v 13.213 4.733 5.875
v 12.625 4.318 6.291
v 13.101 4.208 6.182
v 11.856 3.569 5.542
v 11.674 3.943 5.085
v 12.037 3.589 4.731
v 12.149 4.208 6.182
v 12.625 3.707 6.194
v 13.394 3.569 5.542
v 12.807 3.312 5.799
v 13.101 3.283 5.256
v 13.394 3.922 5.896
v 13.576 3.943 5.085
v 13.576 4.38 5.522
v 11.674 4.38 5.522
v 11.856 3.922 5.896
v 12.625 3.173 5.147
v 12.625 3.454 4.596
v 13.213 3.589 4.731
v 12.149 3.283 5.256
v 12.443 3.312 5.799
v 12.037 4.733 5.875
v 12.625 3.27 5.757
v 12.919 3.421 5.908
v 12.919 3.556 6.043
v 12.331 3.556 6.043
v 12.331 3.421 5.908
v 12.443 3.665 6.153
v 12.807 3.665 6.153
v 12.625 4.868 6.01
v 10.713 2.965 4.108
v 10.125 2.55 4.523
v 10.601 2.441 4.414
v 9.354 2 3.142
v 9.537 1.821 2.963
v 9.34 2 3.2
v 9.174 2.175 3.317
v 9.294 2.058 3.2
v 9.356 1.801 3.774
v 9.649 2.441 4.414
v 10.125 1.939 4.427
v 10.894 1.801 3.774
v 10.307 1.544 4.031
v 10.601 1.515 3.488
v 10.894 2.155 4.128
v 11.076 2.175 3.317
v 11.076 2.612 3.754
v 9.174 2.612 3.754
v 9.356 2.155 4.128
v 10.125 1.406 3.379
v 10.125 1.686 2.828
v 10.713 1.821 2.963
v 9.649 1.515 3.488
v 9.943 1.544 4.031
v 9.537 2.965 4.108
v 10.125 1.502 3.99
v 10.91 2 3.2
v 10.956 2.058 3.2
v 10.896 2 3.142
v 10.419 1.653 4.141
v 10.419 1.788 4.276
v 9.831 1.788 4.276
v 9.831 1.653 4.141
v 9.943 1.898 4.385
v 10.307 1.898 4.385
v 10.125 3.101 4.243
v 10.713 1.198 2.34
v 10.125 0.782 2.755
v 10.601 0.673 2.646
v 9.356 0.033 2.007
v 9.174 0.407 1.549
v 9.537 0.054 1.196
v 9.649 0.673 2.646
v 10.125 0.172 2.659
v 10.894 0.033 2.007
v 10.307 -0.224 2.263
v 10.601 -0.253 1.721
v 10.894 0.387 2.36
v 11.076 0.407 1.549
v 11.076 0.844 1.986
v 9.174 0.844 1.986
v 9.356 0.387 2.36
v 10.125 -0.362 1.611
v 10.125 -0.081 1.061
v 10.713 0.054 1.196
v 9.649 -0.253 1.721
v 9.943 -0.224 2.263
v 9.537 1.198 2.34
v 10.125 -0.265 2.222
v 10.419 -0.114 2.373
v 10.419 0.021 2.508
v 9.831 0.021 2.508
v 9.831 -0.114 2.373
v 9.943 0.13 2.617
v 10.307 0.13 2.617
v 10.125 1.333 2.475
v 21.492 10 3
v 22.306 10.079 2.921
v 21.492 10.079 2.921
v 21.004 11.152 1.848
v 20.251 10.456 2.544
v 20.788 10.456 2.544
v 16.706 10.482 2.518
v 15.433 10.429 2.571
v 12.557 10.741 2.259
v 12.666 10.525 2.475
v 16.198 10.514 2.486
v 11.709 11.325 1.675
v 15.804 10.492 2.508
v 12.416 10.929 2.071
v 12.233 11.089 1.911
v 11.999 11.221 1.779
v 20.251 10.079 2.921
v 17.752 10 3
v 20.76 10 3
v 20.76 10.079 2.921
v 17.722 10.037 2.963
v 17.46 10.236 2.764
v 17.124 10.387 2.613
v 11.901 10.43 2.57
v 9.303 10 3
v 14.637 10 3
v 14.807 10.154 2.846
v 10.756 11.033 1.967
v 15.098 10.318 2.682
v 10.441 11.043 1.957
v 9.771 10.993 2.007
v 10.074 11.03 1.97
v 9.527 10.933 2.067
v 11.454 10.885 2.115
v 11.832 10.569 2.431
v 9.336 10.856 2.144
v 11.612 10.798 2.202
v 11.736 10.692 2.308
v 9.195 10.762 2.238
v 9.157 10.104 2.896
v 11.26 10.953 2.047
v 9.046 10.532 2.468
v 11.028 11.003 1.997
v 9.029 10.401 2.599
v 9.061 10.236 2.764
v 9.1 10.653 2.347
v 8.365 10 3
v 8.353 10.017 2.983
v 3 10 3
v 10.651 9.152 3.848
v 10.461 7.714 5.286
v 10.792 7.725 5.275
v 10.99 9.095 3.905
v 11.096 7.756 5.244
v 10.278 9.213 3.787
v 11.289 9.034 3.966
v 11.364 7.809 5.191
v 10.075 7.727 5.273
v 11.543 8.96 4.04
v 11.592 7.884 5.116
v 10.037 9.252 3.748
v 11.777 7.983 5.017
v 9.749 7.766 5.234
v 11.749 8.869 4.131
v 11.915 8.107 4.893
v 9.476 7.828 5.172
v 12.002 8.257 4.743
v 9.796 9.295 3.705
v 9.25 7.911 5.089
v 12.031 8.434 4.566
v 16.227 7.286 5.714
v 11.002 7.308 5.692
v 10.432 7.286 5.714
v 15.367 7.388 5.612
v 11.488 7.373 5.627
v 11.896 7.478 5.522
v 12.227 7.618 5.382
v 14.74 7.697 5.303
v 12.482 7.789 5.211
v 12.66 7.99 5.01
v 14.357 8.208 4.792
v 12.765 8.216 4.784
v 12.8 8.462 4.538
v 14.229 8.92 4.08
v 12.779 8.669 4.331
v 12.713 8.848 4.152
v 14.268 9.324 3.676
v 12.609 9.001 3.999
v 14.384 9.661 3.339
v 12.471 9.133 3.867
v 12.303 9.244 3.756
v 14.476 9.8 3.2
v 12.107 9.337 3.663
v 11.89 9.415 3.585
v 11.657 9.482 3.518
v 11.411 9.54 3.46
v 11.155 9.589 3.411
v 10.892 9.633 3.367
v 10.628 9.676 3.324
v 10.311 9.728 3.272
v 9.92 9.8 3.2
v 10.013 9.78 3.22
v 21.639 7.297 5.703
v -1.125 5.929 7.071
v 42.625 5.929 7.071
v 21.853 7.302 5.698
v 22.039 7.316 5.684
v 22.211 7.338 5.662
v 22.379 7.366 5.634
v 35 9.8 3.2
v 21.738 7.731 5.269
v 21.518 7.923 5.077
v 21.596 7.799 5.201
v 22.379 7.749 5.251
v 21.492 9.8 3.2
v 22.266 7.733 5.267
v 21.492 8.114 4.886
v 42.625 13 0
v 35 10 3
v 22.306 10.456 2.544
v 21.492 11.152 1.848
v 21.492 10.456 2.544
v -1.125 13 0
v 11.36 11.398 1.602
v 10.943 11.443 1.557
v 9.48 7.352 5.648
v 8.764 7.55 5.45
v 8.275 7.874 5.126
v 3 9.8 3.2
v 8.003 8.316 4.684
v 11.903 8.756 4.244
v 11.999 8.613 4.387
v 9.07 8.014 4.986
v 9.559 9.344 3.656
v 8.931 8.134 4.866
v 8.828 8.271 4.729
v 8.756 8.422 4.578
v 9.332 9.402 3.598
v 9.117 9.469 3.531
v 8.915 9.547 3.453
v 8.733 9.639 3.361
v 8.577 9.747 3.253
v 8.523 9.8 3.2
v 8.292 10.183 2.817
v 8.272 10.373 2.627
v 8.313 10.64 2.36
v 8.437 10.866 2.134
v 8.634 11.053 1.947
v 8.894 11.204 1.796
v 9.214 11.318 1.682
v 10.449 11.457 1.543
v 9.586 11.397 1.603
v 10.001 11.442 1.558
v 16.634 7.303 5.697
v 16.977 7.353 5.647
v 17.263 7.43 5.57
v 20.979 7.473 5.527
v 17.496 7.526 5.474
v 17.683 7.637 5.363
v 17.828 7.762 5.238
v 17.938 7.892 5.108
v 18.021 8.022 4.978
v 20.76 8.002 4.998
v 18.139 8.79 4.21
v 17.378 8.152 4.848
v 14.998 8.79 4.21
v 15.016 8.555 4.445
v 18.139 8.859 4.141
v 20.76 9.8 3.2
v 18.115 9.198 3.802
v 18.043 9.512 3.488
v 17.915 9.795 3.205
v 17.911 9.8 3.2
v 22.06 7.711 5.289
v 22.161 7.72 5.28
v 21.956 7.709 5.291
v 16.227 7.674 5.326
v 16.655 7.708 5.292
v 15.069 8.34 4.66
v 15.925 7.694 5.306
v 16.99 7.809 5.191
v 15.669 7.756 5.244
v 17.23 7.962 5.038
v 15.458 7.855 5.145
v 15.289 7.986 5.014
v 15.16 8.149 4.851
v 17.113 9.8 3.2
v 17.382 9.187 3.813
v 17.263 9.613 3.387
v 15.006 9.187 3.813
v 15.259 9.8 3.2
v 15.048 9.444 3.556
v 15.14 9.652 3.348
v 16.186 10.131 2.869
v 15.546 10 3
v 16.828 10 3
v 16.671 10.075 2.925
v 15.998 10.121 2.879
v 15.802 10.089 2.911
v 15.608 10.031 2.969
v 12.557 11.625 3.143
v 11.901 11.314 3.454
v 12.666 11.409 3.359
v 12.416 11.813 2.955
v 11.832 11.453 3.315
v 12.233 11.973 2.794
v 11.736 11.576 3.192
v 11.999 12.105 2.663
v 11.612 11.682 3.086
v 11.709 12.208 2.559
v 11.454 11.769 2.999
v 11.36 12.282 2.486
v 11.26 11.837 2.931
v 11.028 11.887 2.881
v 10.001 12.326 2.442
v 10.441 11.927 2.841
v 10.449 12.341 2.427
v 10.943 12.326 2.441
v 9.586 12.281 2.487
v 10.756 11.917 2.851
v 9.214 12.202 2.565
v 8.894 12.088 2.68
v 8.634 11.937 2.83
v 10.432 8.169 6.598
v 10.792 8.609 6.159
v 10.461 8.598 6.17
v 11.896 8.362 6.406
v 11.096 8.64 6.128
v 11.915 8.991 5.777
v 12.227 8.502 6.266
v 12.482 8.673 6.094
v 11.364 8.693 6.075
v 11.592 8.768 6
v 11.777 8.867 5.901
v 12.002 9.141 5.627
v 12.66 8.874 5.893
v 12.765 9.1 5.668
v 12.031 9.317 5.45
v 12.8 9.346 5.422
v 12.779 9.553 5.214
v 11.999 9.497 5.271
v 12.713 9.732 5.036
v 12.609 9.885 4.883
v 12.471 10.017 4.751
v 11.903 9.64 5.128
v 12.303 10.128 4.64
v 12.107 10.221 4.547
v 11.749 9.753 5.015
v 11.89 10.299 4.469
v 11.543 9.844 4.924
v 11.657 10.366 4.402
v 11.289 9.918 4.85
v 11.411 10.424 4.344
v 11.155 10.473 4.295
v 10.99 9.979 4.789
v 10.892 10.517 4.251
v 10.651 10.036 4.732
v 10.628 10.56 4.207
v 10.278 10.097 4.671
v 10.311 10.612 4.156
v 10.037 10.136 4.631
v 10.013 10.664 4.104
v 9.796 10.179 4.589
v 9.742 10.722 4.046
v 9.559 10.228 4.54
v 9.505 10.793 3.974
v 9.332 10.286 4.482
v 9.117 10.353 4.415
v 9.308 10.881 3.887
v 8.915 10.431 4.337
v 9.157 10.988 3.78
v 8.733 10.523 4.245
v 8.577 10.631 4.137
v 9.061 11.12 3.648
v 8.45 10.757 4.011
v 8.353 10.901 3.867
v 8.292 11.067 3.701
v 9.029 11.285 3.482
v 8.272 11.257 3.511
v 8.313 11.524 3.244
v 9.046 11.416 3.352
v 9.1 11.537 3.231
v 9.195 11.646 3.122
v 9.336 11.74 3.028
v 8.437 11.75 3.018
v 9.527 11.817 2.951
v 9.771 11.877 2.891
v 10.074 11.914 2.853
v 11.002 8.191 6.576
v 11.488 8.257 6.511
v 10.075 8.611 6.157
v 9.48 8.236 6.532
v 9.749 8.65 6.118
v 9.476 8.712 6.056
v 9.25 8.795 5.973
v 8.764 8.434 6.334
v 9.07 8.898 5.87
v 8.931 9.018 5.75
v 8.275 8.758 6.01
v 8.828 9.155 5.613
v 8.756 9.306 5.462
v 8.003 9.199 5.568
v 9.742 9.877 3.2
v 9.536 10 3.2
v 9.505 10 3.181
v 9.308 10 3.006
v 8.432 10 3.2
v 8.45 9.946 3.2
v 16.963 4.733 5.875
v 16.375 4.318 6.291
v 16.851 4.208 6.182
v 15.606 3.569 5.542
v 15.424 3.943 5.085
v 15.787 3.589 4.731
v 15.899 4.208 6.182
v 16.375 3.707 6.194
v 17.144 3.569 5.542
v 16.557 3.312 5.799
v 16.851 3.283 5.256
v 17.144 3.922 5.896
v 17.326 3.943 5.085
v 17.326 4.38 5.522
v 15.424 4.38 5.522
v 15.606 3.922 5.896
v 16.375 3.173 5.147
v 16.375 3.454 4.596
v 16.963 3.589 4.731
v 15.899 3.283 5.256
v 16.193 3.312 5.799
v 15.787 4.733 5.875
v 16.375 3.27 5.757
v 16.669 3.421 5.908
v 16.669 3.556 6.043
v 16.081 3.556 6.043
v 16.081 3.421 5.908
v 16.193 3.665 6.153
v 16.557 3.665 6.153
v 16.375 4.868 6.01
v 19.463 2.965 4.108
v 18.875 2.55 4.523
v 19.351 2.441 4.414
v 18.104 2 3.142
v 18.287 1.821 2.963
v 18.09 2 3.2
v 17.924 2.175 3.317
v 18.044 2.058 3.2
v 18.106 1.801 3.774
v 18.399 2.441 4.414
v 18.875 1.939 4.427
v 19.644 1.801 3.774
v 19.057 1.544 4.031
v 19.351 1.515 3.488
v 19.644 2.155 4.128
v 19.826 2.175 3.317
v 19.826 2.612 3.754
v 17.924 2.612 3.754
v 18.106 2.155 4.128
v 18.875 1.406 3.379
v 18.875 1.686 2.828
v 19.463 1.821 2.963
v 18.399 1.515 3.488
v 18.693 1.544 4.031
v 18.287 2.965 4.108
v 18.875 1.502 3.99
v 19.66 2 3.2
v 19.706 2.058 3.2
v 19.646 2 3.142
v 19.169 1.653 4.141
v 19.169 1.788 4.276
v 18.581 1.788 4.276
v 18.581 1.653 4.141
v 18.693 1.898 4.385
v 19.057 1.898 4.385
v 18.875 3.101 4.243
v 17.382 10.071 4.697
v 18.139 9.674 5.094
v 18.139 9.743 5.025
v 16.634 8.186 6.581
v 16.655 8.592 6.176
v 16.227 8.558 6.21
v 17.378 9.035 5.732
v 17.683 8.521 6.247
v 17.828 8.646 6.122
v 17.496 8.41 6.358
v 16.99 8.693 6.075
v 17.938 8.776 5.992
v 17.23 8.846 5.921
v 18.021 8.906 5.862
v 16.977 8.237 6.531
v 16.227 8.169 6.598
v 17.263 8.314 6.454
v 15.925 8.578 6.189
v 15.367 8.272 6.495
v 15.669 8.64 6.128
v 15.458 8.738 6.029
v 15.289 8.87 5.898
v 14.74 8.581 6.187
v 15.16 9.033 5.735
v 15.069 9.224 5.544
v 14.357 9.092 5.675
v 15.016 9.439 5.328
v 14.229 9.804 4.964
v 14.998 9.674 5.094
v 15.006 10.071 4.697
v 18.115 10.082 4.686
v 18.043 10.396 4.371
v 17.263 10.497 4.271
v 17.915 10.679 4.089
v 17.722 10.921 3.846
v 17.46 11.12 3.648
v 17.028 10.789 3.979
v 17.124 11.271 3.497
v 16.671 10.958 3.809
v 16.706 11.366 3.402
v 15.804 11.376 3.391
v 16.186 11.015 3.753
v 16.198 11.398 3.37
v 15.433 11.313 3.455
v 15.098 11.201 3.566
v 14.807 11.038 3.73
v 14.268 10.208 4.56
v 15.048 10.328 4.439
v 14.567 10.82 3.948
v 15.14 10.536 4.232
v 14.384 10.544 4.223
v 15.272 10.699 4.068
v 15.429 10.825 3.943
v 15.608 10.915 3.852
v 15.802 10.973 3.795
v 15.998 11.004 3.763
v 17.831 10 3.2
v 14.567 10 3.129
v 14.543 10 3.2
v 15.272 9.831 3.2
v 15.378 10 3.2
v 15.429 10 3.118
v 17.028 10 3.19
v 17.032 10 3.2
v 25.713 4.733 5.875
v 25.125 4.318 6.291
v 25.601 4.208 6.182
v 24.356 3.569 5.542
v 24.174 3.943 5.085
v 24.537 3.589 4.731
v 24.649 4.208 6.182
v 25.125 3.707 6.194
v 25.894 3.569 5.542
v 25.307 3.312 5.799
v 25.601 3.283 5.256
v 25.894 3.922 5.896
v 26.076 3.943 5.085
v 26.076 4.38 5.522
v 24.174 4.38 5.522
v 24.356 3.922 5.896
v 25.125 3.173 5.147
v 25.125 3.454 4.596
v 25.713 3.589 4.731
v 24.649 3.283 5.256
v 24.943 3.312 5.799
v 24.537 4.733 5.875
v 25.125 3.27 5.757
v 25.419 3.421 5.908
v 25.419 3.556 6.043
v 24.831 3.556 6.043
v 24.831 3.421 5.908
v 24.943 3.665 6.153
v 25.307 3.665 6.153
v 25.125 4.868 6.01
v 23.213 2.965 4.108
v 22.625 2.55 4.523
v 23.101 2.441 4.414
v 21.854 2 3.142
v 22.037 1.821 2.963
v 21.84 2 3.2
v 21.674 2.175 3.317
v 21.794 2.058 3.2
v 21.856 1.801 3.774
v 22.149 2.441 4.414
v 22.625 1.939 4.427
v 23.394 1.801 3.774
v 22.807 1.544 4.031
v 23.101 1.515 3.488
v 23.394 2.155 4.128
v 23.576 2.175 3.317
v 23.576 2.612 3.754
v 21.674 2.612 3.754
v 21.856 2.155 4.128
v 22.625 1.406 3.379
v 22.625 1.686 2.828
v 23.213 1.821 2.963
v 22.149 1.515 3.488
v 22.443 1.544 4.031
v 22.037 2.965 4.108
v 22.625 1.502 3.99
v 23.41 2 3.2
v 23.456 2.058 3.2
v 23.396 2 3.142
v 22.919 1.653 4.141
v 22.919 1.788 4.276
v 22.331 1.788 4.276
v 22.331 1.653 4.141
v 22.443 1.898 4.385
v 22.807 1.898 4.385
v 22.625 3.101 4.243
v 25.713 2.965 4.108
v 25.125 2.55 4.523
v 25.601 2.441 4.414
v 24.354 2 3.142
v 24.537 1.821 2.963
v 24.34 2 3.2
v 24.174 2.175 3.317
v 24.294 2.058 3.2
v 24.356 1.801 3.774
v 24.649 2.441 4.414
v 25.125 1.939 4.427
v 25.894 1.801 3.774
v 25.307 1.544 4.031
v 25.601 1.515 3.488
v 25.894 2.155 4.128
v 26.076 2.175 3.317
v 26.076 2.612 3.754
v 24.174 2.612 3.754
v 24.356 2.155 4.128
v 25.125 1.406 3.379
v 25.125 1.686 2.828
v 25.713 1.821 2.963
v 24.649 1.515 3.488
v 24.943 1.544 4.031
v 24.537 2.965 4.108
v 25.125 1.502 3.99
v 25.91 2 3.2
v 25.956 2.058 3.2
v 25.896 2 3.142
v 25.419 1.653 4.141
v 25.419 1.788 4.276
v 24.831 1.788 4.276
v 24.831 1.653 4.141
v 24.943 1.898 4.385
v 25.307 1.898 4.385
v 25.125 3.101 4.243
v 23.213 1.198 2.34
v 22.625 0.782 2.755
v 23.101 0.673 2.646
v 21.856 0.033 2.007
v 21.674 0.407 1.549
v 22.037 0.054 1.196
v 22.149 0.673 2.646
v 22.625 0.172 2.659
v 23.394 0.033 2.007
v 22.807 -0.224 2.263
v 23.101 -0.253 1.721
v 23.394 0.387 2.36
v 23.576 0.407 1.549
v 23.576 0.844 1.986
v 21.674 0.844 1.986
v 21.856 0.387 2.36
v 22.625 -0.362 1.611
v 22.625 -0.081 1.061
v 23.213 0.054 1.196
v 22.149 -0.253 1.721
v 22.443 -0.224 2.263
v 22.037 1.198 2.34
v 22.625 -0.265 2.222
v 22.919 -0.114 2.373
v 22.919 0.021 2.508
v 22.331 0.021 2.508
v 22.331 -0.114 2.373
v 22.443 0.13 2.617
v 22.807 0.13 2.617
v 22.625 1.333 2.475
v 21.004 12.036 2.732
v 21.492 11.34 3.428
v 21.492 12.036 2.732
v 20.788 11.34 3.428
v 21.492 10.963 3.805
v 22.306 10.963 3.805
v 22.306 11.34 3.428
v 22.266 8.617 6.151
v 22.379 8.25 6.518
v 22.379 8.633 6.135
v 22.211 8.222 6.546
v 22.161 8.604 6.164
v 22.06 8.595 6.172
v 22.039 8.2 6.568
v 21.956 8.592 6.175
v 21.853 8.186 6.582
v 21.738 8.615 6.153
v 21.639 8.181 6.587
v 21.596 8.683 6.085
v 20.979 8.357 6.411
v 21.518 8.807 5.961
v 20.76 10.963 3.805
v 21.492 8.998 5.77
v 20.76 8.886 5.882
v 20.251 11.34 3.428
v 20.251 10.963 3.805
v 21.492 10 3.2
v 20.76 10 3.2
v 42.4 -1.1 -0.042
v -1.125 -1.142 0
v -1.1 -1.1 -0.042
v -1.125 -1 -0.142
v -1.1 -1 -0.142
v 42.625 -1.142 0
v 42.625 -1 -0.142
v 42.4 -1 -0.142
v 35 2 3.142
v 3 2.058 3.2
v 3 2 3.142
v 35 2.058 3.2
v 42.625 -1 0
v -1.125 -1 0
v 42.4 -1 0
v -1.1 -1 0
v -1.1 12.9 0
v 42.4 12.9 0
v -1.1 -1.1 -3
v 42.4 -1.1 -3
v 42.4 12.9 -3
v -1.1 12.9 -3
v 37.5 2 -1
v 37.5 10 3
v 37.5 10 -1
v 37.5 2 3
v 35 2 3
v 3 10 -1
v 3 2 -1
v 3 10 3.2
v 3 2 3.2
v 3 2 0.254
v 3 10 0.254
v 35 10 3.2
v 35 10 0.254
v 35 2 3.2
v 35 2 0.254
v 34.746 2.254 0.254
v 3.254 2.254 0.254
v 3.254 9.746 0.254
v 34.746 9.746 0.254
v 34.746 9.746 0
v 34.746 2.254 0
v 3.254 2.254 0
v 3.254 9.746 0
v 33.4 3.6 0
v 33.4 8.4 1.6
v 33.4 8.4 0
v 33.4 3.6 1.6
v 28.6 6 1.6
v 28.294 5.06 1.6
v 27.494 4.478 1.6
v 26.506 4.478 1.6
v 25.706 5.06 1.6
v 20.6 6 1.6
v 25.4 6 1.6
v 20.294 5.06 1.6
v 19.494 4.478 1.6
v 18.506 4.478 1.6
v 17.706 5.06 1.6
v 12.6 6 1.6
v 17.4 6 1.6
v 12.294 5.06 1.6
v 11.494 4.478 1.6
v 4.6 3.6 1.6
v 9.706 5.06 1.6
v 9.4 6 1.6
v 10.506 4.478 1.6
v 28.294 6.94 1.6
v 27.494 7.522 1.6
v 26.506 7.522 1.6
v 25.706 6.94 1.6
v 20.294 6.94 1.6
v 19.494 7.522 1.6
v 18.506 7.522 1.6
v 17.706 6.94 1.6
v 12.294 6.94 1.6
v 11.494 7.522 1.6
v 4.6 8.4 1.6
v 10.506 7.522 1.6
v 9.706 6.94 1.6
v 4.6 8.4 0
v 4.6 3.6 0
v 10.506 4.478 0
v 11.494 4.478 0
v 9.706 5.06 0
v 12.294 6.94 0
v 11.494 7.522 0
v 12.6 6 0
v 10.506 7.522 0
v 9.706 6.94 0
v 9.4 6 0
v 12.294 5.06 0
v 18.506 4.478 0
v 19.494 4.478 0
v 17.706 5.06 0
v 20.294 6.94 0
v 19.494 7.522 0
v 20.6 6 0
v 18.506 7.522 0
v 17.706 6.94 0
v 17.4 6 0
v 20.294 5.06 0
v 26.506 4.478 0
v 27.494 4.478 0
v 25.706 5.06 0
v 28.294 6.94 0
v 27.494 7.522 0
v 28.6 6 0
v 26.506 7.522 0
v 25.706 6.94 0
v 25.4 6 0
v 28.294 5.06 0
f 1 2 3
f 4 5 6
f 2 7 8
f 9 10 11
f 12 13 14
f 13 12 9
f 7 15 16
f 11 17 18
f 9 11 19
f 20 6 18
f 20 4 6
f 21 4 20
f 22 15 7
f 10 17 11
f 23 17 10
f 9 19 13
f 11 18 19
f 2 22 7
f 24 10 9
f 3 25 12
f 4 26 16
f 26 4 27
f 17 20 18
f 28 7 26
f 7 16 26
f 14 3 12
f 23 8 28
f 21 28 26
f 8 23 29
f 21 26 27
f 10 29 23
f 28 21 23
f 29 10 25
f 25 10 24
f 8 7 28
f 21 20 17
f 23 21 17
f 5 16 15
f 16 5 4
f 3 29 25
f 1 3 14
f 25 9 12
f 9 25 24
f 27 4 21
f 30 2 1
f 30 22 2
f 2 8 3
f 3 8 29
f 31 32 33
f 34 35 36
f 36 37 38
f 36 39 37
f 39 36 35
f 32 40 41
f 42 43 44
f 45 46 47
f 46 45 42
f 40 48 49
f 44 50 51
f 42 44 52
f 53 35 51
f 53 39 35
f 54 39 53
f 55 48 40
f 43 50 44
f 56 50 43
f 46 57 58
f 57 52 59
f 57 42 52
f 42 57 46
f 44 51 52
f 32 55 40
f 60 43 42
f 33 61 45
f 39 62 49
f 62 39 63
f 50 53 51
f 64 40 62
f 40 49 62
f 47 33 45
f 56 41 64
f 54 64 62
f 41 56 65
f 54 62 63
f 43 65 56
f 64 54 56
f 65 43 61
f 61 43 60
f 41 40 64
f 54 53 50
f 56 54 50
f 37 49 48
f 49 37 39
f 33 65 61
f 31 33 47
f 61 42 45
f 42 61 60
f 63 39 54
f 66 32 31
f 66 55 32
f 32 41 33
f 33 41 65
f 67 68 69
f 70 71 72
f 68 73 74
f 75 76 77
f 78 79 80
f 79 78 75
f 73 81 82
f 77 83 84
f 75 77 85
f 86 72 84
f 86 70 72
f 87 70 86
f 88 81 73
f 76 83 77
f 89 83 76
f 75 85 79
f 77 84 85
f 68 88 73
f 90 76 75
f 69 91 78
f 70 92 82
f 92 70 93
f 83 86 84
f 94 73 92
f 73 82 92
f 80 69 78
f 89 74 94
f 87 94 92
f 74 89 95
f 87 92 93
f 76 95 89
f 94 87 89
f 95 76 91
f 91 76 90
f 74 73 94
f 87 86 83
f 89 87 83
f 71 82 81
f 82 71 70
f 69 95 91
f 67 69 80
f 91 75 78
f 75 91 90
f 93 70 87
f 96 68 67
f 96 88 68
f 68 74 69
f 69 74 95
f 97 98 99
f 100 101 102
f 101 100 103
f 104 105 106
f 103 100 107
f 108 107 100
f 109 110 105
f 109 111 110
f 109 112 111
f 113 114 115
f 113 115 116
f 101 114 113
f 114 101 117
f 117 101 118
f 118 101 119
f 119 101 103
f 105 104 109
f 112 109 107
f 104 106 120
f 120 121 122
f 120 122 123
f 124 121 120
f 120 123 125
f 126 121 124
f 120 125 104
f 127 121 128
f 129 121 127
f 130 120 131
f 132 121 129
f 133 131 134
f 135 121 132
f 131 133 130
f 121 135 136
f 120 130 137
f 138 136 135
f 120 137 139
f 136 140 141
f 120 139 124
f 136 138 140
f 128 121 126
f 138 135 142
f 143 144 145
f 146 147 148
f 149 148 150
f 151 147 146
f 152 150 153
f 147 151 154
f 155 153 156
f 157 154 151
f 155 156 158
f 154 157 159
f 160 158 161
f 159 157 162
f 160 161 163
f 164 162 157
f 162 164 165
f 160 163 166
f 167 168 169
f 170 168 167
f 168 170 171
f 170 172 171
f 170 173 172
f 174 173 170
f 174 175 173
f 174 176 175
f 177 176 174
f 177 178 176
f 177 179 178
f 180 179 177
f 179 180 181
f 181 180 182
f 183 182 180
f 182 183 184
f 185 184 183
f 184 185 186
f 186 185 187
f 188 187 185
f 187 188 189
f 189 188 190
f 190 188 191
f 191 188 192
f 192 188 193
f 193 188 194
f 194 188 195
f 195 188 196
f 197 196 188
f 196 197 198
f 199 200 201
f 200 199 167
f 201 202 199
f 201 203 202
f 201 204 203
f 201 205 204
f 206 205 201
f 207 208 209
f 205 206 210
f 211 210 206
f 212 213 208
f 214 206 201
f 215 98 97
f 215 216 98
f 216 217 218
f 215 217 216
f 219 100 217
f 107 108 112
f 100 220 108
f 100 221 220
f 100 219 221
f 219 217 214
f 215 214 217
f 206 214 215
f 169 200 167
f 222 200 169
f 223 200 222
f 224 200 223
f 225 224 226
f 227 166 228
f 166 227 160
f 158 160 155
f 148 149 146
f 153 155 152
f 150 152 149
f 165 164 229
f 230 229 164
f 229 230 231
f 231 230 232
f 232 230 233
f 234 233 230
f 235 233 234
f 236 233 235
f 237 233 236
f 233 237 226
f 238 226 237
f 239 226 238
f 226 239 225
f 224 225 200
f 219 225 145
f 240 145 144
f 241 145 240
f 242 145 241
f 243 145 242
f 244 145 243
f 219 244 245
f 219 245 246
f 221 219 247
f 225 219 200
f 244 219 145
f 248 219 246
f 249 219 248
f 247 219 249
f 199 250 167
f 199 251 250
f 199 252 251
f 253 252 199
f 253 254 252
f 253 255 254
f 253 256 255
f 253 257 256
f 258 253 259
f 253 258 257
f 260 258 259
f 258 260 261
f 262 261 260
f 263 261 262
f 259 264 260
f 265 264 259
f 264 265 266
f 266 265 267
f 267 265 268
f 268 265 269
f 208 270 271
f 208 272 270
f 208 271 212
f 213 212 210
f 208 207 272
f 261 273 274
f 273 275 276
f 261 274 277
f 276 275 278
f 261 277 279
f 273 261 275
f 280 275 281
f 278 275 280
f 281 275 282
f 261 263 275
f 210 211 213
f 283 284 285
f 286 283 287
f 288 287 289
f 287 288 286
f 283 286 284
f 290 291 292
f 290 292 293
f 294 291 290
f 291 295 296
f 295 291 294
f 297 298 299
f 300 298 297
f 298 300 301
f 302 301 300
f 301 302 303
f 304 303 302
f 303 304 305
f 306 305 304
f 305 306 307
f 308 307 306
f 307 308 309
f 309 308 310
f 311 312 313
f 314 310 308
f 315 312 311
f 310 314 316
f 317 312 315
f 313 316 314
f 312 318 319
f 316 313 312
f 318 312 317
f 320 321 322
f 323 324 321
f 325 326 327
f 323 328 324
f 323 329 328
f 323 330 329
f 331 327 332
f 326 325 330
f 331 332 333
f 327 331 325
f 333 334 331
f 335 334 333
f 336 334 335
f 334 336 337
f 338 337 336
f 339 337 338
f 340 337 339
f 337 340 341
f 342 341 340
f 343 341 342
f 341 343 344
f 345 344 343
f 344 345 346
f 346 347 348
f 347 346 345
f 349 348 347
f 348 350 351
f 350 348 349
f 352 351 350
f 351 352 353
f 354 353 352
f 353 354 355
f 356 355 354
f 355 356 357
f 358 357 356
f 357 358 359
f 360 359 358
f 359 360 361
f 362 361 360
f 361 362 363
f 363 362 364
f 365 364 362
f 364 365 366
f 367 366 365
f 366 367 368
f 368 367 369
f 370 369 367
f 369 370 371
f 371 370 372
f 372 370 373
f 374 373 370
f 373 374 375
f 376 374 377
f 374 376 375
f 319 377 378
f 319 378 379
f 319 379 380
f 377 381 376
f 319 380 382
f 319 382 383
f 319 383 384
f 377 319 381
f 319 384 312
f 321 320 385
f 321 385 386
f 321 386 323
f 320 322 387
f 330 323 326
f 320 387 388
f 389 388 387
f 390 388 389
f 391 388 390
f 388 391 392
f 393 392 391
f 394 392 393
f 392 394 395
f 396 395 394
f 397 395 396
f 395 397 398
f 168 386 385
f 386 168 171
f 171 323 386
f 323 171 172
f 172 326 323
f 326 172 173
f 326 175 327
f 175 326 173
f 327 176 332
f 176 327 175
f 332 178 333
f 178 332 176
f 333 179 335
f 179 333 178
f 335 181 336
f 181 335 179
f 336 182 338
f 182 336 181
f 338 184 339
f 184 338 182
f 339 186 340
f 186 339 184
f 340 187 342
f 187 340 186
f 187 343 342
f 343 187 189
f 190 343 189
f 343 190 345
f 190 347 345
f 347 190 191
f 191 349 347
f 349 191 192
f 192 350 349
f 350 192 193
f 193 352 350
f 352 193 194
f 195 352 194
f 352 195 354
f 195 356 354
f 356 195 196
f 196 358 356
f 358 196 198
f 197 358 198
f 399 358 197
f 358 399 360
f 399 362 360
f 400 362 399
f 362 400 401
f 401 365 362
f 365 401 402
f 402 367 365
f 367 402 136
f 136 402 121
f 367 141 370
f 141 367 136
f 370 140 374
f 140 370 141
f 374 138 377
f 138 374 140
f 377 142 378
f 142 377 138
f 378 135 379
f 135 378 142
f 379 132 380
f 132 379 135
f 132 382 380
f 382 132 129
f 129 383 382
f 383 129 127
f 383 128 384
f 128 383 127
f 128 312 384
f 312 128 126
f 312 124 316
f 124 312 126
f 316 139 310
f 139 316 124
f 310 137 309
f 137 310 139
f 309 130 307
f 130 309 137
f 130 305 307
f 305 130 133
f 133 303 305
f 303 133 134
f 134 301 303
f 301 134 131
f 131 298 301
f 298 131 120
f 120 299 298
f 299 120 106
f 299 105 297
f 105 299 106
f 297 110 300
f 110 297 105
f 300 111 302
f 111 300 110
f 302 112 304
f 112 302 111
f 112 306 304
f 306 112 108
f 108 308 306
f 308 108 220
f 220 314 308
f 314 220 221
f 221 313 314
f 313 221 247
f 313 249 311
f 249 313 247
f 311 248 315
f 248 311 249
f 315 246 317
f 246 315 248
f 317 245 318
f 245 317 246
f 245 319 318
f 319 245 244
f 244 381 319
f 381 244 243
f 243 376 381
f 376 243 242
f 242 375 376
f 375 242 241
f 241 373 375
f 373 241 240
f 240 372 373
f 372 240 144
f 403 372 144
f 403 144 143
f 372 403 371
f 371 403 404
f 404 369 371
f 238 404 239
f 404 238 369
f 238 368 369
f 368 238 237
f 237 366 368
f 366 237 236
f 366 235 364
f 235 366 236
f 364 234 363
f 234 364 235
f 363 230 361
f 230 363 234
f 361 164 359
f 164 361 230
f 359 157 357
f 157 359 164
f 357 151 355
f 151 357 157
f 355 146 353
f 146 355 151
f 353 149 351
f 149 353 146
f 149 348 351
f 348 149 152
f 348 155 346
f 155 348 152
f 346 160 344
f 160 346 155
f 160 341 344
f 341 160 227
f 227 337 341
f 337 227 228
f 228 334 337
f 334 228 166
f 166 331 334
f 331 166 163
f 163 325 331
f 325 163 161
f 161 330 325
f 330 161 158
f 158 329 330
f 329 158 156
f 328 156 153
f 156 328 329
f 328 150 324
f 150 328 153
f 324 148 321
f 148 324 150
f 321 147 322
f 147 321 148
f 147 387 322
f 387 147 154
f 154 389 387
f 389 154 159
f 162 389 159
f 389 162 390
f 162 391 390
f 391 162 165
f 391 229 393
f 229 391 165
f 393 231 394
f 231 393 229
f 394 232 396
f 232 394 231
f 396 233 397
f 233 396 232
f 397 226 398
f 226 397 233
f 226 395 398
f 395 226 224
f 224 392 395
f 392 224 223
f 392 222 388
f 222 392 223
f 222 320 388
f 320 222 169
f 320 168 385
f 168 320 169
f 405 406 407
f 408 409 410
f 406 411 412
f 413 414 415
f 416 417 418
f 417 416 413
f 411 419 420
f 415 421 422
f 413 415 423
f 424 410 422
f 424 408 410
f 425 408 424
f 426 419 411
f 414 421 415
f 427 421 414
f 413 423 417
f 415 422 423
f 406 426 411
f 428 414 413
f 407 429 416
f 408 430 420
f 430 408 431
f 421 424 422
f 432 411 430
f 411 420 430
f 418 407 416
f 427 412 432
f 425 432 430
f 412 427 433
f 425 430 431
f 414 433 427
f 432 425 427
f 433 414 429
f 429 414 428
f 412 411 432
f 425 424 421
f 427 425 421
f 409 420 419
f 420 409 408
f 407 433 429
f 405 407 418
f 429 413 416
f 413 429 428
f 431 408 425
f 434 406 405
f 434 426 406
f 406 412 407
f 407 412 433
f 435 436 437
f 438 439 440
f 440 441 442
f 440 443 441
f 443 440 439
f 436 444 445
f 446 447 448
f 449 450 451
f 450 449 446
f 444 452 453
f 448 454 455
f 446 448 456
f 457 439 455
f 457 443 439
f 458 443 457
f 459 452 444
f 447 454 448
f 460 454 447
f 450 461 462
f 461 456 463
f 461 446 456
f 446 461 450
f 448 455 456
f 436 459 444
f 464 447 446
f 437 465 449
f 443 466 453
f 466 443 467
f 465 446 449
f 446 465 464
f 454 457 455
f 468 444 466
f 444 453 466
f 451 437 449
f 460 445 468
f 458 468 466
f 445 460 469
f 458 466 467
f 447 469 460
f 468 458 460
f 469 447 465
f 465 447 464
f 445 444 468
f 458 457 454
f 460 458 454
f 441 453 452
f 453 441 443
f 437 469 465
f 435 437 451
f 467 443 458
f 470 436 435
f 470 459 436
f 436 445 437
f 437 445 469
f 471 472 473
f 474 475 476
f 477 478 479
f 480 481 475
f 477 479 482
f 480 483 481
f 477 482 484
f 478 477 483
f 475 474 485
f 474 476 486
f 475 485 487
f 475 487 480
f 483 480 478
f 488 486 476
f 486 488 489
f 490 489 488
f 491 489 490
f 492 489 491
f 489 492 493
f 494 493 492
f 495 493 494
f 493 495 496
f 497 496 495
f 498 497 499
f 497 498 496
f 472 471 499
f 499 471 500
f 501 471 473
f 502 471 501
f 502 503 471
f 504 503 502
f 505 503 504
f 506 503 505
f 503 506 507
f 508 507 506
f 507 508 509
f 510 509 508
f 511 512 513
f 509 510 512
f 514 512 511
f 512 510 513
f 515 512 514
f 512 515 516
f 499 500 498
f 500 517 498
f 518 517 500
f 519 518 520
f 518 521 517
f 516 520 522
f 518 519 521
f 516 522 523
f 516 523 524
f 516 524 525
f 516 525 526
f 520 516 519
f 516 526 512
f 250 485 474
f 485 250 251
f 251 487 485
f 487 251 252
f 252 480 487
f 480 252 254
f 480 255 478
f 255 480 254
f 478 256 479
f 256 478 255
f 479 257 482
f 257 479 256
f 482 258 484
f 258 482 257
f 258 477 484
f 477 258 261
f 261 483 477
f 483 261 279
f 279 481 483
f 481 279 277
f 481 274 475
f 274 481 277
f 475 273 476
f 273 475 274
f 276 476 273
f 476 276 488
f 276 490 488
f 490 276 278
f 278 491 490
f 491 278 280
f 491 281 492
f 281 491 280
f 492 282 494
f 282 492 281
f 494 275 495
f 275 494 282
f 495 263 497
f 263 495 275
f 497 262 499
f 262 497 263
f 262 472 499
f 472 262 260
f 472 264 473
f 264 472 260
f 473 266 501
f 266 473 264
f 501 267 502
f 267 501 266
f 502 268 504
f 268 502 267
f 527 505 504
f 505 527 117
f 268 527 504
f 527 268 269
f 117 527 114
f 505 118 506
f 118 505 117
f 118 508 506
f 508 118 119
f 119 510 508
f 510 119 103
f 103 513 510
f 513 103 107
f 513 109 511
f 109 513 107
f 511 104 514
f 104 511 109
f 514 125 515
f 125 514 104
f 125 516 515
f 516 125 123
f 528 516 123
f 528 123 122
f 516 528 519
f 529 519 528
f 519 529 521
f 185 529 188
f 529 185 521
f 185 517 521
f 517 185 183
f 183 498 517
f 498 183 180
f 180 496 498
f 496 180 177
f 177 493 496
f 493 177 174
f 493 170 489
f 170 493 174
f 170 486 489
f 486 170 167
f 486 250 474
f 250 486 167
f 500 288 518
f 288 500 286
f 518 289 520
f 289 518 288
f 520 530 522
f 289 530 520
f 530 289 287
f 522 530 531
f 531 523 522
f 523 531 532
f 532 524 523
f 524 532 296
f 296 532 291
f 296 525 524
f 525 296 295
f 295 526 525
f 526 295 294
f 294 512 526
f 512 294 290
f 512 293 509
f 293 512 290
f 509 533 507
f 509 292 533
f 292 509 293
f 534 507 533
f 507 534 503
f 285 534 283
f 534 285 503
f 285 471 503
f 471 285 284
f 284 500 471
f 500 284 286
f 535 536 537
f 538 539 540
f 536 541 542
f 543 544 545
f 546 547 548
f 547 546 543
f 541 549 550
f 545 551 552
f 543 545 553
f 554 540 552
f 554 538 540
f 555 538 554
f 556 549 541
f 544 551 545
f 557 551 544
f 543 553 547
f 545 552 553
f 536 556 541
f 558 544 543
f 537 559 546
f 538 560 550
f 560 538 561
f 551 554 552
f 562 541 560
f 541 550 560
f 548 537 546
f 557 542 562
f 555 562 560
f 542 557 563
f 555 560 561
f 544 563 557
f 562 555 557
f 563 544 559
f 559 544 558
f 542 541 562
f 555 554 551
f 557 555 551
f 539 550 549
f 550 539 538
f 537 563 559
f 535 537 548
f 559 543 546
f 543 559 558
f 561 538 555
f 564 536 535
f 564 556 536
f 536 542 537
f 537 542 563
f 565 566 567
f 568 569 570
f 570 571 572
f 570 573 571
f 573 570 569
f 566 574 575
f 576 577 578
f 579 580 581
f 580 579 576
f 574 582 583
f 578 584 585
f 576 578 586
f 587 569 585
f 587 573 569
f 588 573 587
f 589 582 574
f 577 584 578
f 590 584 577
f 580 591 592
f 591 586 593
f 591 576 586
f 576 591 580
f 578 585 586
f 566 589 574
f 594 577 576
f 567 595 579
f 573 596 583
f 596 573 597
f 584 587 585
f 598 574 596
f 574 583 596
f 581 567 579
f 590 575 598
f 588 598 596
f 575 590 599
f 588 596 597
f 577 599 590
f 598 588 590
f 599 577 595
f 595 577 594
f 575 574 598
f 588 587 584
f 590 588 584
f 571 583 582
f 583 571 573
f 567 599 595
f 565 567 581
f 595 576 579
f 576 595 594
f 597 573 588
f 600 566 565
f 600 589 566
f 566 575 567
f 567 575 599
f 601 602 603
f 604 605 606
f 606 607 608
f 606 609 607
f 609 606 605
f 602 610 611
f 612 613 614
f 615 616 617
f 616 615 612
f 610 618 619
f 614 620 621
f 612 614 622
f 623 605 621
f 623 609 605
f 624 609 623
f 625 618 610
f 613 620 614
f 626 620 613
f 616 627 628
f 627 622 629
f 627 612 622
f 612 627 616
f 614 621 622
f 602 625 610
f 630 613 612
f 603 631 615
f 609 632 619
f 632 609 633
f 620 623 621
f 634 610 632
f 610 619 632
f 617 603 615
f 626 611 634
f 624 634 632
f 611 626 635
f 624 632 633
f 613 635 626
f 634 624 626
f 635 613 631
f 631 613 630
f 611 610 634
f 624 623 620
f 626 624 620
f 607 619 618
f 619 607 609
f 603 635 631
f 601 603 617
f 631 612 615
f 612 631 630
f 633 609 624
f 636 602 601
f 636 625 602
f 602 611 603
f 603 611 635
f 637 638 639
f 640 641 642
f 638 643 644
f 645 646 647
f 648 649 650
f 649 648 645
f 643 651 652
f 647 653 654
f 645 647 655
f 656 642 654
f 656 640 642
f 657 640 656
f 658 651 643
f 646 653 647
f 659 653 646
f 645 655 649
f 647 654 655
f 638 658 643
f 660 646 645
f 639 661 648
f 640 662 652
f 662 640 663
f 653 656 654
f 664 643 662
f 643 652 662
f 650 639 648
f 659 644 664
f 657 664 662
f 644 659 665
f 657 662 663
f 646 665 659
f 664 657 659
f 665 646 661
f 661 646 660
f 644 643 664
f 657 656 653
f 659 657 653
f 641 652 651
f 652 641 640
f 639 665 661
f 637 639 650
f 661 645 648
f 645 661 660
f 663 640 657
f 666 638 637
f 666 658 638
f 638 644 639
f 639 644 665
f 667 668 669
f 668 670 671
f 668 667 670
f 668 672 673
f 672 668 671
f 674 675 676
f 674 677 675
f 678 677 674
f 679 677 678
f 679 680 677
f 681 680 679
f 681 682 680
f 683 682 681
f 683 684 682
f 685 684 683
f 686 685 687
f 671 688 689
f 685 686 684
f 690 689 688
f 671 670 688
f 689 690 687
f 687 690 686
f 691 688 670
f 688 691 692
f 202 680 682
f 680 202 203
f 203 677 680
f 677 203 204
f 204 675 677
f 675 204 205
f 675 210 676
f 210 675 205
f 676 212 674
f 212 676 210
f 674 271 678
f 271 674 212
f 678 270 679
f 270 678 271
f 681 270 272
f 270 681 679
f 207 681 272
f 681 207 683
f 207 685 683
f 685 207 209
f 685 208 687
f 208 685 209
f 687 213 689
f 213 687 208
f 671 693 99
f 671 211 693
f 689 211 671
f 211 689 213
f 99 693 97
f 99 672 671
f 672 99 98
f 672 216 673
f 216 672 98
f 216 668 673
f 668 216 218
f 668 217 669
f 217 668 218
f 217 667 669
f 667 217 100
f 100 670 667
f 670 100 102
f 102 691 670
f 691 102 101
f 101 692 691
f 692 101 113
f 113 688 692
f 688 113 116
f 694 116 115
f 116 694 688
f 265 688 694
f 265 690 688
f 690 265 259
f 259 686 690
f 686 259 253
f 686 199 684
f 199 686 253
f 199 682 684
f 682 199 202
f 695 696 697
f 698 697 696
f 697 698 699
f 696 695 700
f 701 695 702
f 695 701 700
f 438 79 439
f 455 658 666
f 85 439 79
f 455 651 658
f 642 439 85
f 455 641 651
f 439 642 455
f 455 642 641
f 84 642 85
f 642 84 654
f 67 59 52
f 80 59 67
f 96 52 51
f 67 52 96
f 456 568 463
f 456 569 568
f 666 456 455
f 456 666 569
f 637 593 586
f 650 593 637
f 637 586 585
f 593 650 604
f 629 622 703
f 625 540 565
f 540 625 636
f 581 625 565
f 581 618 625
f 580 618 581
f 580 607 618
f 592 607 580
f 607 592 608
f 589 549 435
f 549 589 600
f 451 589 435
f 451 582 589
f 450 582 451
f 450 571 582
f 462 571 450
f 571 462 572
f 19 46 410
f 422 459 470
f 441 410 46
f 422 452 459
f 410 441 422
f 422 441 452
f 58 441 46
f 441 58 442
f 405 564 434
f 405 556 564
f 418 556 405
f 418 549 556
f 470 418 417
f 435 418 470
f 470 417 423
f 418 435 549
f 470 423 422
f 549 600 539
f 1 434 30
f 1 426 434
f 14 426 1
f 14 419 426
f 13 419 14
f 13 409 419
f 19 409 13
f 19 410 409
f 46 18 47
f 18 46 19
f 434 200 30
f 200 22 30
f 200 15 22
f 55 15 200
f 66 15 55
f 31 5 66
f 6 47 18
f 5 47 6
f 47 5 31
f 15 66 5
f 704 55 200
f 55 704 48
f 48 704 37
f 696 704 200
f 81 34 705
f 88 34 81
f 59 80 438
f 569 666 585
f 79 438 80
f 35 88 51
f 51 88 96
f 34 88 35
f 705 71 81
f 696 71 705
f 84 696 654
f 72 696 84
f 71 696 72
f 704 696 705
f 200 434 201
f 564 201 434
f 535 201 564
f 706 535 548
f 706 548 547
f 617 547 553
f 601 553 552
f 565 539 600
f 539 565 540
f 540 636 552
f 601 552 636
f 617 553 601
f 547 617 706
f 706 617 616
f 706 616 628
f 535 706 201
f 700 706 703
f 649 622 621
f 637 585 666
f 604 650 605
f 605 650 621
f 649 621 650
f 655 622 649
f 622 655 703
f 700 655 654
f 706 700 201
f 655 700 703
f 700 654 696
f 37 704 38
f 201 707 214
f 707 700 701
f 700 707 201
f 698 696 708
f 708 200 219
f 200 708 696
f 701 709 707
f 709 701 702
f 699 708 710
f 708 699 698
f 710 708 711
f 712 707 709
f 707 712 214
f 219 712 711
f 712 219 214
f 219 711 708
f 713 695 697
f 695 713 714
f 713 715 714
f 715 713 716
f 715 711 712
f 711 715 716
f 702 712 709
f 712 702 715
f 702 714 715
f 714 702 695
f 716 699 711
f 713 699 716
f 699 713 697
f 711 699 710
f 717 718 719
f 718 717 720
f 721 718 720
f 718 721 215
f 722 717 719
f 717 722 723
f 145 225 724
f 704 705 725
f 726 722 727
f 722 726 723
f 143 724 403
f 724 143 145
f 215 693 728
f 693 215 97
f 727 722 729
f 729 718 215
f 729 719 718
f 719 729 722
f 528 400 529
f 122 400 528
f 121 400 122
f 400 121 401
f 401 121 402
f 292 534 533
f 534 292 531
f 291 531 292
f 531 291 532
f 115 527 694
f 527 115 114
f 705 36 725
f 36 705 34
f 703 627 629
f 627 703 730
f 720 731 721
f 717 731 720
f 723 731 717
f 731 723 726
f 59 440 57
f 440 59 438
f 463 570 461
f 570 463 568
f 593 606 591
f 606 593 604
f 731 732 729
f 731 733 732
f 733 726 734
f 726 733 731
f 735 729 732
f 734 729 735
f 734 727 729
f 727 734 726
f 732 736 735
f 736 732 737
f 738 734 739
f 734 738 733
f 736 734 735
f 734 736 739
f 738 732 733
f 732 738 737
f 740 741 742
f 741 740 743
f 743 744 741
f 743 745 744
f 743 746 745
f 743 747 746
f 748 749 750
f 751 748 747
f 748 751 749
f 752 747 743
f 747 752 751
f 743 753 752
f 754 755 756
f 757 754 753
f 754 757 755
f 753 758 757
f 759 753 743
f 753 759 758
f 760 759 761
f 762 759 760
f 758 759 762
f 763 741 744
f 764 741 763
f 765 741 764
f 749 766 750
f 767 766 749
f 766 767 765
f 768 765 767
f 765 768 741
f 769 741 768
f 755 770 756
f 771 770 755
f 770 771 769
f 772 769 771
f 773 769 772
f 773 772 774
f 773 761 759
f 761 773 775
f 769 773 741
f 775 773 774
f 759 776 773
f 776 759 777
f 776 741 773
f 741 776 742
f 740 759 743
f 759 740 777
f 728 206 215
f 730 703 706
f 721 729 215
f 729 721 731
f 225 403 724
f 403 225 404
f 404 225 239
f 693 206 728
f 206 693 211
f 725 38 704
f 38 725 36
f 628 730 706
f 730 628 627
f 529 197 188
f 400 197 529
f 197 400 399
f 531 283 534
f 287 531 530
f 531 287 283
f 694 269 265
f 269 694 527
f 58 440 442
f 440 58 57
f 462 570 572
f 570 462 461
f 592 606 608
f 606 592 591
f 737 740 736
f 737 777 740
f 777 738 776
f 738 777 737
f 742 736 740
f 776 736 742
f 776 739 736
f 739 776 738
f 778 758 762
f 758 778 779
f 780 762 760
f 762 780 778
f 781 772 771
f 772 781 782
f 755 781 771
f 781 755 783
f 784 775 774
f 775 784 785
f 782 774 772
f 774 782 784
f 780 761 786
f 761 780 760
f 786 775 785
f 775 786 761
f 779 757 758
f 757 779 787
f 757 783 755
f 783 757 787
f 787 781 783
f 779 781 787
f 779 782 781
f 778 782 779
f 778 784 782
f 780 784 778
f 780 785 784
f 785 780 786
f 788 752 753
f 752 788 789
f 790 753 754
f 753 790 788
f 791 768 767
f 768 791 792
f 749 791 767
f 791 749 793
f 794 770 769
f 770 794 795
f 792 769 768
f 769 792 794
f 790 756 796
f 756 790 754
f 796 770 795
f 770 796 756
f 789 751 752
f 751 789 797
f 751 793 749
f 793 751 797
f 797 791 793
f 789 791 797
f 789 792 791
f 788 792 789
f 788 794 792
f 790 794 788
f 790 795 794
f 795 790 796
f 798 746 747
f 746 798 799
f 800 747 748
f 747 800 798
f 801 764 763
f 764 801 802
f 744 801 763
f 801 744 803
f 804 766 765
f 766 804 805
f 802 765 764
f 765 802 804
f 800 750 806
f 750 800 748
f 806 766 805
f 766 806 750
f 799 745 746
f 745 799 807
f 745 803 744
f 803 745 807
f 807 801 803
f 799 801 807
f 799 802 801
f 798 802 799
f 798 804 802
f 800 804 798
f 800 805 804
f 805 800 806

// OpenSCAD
// file: ../OpenSCAD/brailleAndText.scad
/*
Braille Module
http://creativecommons.org/licenses/by/3.0/
*/


// mm sizes from http://dots.physics.orst.edu/gs_layout.html
radius = 0.25;
spacing = 2.5;
startOffset = 3.75;
distance = startOffset + spacing;

plate_height = 10;
plate_thickness = 10;   // was 2.

$fn = 10;



module letter(bitmap, char) {
//    echo(char);
	row_size = 2;
	col_size = 3;
	bitmap_size = row_size * col_size;
	
	function loc_x(loc) = floor(loc / row_size) * spacing + spacing;
	function loc_y(loc) = loc % row_size * spacing  + (distance-spacing)/2;

    translate([0, loc_y(-1), -2]) {
        rotate([270, 0, 90]) {
            linear_extrude(height = 1.25)
            text(char, 6);
        }
    }
	
    for (loc = [0:bitmap_size - 1]) {
		if (bitmap[loc] != 0) {
			union() {
				translate(v = [loc_x(loc), loc_y(loc), 0]) {
					sphere(radius = radius* bitmap[loc], center = true);
				}
			}
		}
	}
}


module braille_char(char) {
	if (char == "A" || char == "a") {
		letter([
			1,0,
			0,0,
			0,0
		], char);
	} else if (char == "B" || char == "b") {
		letter([
			1,0,
			1,0,
			0,0
		], char);
	} else if (char == "C" || char == "c") {
		letter([
			1,1,
			0,0,
			0,0
		], char);
	} else if (char == "D" || char == "d") {
		letter([
			1,1,
			0,1,
			0,0
		], char);
	} else if (char == "E" || char == "e") {
		letter([
			1,0,
			0,1,
			0,0
		], char);
	} else if (char == "F" || char == "f") {
		letter([
			1,1,
			1,0,
			0,0
		], char);
	} else if (char == "G" || char == "g") {
		letter([
			1,1,
			1,1,
			0,0
		], char);
	} else if (char == "H" || char == "h") {
		letter([
			1,0,
			1,1,
			0,0
		], char);
	} else if (char == "I" || char == "i") {
		letter([
			0,1,
			1,0,
			0,0
		], char);
	} else if (char == "J" || char == "j") {
		letter([
			0,1,
			1,1,
			0,0
		], char);
	} else if (char == "K" || char == "k") {
		letter([
			1,0,
			0,0,
			1,0
		], char);
	} else if (char == "L" || char == "l") {
		letter([
			1,0,
			1,0,
			1,0
		], char);
	} else if (char == "M" || char == "m") {
		letter([
			1,1,
			0,0,
			1,0
		], char);
	} else if (char == "N" || char == "n") {
		letter([
			1,1,
			0,1,
			1,0
		], char);
	} else if (char == "O" || char == "o") {
		letter([
			1,0,
			0,1,
			1,0
		], char);
	} else if (char == "P" || char == "p") {
		letter([
			1,1,
			1,0,
			1,0
		], char);
	} else if (char == "Q" || char == "q") {
		letter([
			1,1,
			1,1,
			1,0
		], char);
	} else if (char == "R" || char == "r") {
		letter([
			1,0,
			1,1,
			1,0
		], char);
	} else if (char == "S" || char == "s") {
		letter([
			0,1,
			1,0,
			1,0
		], char);
	} else if (char == "T" || char == "t") {
		letter([
			0,1,
			1,1,
			1,0
		], char);
	} else if (char == "U" || char == "u") {
		letter([
			1,0,
			0,0,
			1,1
		], char);
	} else if (char == "V" || char == "v") {
		letter([
			1,0,
			1,1,
			1,0
		], char);
	} else if (char == "W" || char == "w") {
		letter([
			0,1,
			1,1,
			0,1
		], char);
	} else if (char == "X" || char == "x") {
		letter([
			1,1,
			0,0,
			1,1
		], char);
	} else if (char == "Y" || char == "y") {
		letter([
			1,1,
			0,1,
			1,1
		], char);
	} else if (char == "Z" || char == "z") {
		letter([
			1,0,
			0,1,
			1,1
		], char);
    } else if (char == " ") {
		letter([
			0,0,
			0,0,
			0,0
		], char);
	} else {
		echo("Invalid Character: ", char);
	}

}

module braille_str(chars) {
    char_count = len(chars);
	echo(str("Total Width of ", chars, " : ",  distance * char_count, "mm"));
	union() {
		for (count = [0:char_count-1]) {
			translate(v = [0, count * distance, plate_thickness]) {
				braille_char(chars[count]);
			}
		}
		translate(v = [0, -distance/2, 0]) {
			color([0,0,1]) {
				cube(size = [plate_height, distance * (char_count+1), plate_thickness]);
			}
            }                                                      
	}
}

function lenText(txt="Hi") = distance * len(txt);

module printTextAndBraille(textToPrint) {
    blockLen = lenText(textToPrint);
    union()
    {
        difference() {                      // remove second box from first
            rotate([0,45,0]) {              // make it on its edge
                braille_str((textToPrint)); // make a long box
            }
            translate([0, -3.25, -8]) {     // move in right place
                cube(size = [14, (blockLen+8), 8]);
            }
        } 
        translate([0.1, -3.1, -3]) {     // move in right place
            cube(size = [14, (blockLen+6), 3]); 
        }
    }                                 
}

printTextAndBraille("HELLO CalLUM");
// file: ../openSCADLibs/lego_brick_builder.scad
/*

 Basic Lego brick builder module for OpenScad by Jorg Janssen 2013 (CC BY-NC 3.0) 
 To use this in your own projects add:

 use <path_to_this_file/lego_brick_builder.scad>
 brick (length, width, height [,smooth]);

 Length and width are in standard lego brick dimensions. 
 Height is in flat brick heights, so for a normal lego brick height = 3.
 Add optional smooth = true for a brick without studs. 
 Use height = 0 to just put studs/knobs on top of other things.

 */
$fn = 150;

// and this is how it's done:

FLU = 1.6; // Fundamental Lego Unit = 1.6 mm

BRICK_WIDTH = 5*FLU; // basic brick width
BRICK_HEIGHT = 6*FLU; // basic brick height
PLATE_HEIGHT = 2*FLU; // basic plate height
WALL_THICKNESS = FLU; // outer wall of the brick
STUD_RADIUS = 1.5*FLU; // studs are the small cylinders on top of the brick with the lego logo ('nopje' in Dutch)
STUD_HEIGHT = FLU; 
ANTI_STUD_RADIUS = 0.5*4.07*FLU;  // an anti stud is the hollow cylinder inside bricks that have length > 1 and width > 1
PIN_RADIUS = FLU; // a pin is the small cylinder inside bricks that have length = 1 or width = 1
SUPPORT_THICKNESS = 0.254; // support is the thin surface between anti studs, pins and walls, your printer might not print this thin, try thicker!
EDGE = 0.254; // this is the width and height of the bottom line edge of smooth bricks
CORRECTION = 0.1; // addition to each size, to make sure all parts connect by moving them a little inside each other

module brick(length = 4, width = 2, height = 3, smooth = false){

	// brick shell
	difference(){
		cube(size = [length*BRICK_WIDTH,width*BRICK_WIDTH,height*PLATE_HEIGHT]);
		translate([WALL_THICKNESS,WALL_THICKNESS,-WALL_THICKNESS])
		union(){
			cube(size = [length*BRICK_WIDTH-2*WALL_THICKNESS,width*BRICK_WIDTH-2*WALL_THICKNESS,height*PLATE_HEIGHT]);
			// stud inner holes, radius = pin radius
			if (!smooth) {
				translate([STUD_RADIUS+WALL_THICKNESS,STUD_RADIUS+WALL_THICKNESS,height*PLATE_HEIGHT])
				for (y = [0:width-1]){
					for (x = [0:length-1]){
						translate ([x*BRICK_WIDTH-WALL_THICKNESS,y*BRICK_WIDTH-WALL_THICKNESS,-CORRECTION])
						cylinder(h=WALL_THICKNESS+2*CORRECTION,r=PIN_RADIUS);
					}
				}
			}
			// small bottom line edge for smooth bricks
			else {
				translate([-WALL_THICKNESS-CORRECTION,-WALL_THICKNESS-CORRECTION,FLU-CORRECTION]) 
				difference() {
					cube([length*BRICK_WIDTH+2*CORRECTION,width*BRICK_WIDTH+2*CORRECTION,EDGE+CORRECTION]);
					translate([EDGE+CORRECTION,EDGE+CORRECTION,-CORRECTION])
					cube([length*BRICK_WIDTH-2*EDGE,width*BRICK_WIDTH-2*EDGE,EDGE+3*CORRECTION]); 
				}
			}
		}
	}
	// Studs
	if(!smooth){
		translate([STUD_RADIUS+WALL_THICKNESS,STUD_RADIUS+WALL_THICKNESS,height*PLATE_HEIGHT])
		for (y = [0:width-1]){
			for (x = [0:length-1]){
				translate ([x*BRICK_WIDTH,y*BRICK_WIDTH,-CORRECTION])
				difference(){
					cylinder(h=STUD_HEIGHT+CORRECTION, r=STUD_RADIUS);
					// Stud inner holes
					translate([0,0,-CORRECTION])
					cylinder(h=0.5*STUD_HEIGHT+CORRECTION,r=PIN_RADIUS);
				}
				// tech logo - disable this if your printer isn't capable of printing this small
				if ( length > width){
					translate([x*BRICK_WIDTH+0.8,y*BRICK_WIDTH-1.9,STUD_HEIGHT-CORRECTION])
					resize([1.2*1.7,2.2*1.7,0.254+CORRECTION])
					rotate(a=[0,0,90])
					import("tech.stl");
				}
				else {
					translate([x*BRICK_WIDTH-1.9,y*BRICK_WIDTH-0.8,STUD_HEIGHT-CORRECTION])
					resize([2.2*1.7,1.2*1.7,0.254+CORRECTION])
					import("tech.stl");				
				}				
				/* 
				// Alternative 2-square logo
				translate ([x*BRICK_WIDTH+CORRECTION,y*BRICK_WIDTH-CORRECTION,STUD_HEIGHT-CORRECTION])		
				cube([1,1,2*CORRECTION]);
				translate ([x*BRICK_WIDTH-0.9,y*BRICK_WIDTH-0.9,STUD_HEIGHT-CORRECTION])		
				cube([1,1,0.3]);
				*/				
			}
		}
	}
	// Pins x
	if (width == 1 && length > 1) {	
			for (x = [1:length-1]){
				translate([x*BRICK_WIDTH,0.5*BRICK_WIDTH,0])
				cylinder(h=height*PLATE_HEIGHT-WALL_THICKNESS+CORRECTION,r=PIN_RADIUS);
				// Supports
				if (height > 1) {
				translate([x*BRICK_WIDTH-0.5*SUPPORT_THICKNESS,CORRECTION,STUD_HEIGHT])
				cube(size=[SUPPORT_THICKNESS,BRICK_WIDTH-2*CORRECTION,height*PLATE_HEIGHT-STUD_HEIGHT-WALL_THICKNESS+CORRECTION]);
			}
		}
	}
	// Pins y
	if (length == 1 && width > 1) {	
			for (y = [1:width-1]){
			translate([0.5*BRICK_WIDTH,y*BRICK_WIDTH,0])
			cylinder(h=height*PLATE_HEIGHT-WALL_THICKNESS+CORRECTION,r=PIN_RADIUS);
			// Supports
			if (height > 1) {
			translate([CORRECTION,y*BRICK_WIDTH-0.5*SUPPORT_THICKNESS,STUD_HEIGHT])
			cube(size=[BRICK_WIDTH-2*CORRECTION,SUPPORT_THICKNESS,height*PLATE_HEIGHT-STUD_HEIGHT-WALL_THICKNESS+CORRECTION]);}
			
		}
	}
	// Anti Studs
	if (width > 1 && length > 1){
		difference(){
			union(){
				for(y = [1:width-1]){
					for(x = [1:length-1]){
						// anti studs
						translate([x*BRICK_WIDTH,y*BRICK_WIDTH,0])
						cylinder (h=height*PLATE_HEIGHT-WALL_THICKNESS+CORRECTION, r = ANTI_STUD_RADIUS);
						// Supports
						if (height > 1){
							// Support x
							if (x%2 == 0 && (length%2 == 0 || length%4 == 1 && x<length/2 || length%4 == 3 && x>length/2) || x%2 == 1 && (length%4 == 3 && x<length/2 || length%4 == 1 && x>length/2)) {
								translate([BRICK_WIDTH*x-0.5*SUPPORT_THICKNESS,y*BRICK_WIDTH-BRICK_WIDTH+WALL_THICKNESS-CORRECTION,STUD_HEIGHT])
								cube(size=[SUPPORT_THICKNESS,2*BRICK_WIDTH-2*WALL_THICKNESS,height*PLATE_HEIGHT-STUD_HEIGHT-WALL_THICKNESS+CORRECTION]);
							}
							// Supports y							
							if (y%2 == 0 && (width%2 == 0 || width%4 == 1 && y<width/2 || width%4 == 3 && y>width/2) || y%2 == 1 && (width%4 == 3 && y<width/2 || width%4 == 1 && y>width/2)) {
								translate([x*BRICK_WIDTH-BRICK_WIDTH+WALL_THICKNESS-CORRECTION,BRICK_WIDTH*y-0.5*SUPPORT_THICKNESS,STUD_HEIGHT])
								cube(size=[2*BRICK_WIDTH-2*WALL_THICKNESS,SUPPORT_THICKNESS,height*PLATE_HEIGHT-STUD_HEIGHT-WALL_THICKNESS+CORRECTION]);
							}
						}
					}
				}
			}
			union(){
				for(y = [1:width-1]){
					for(x = [1:length-1]){
						// hollow anti studs
						translate([x*BRICK_WIDTH,y*BRICK_WIDTH,-WALL_THICKNESS])
						cylinder (h=height*PLATE_HEIGHT, r = STUD_RADIUS);				
					}
				}
			}
		}		
	}
}
	
// file: ../OpenSCAD/TextAndBrailleLegoBlock.scad
 include <../openSCADLibs/lego_brick_builder.scad>
 include <../OpenSCAD/brailleAndText.scad>;

module brickAndText(text) {
    txtLen = distance * len(text);
    echo(distance);
    difference() {
        rotate([180,180,90])
            translate([-13, 2, 0])
                printTextAndBraille(text);
        translate([3, 2, -1]) 
            cube([txtLen - 3, BRICK_WIDTH, 4]);
    }
    translate([3,2,0])
        brick(floor(txtLen / BRICK_WIDTH),1,1, true);    
}

// use <../BPNodesV2/TextNBraille.scad>
//brickAndText("This is a test string");  
// main file
use <../OpenSCAD/TextAndBrailleLegoBlock.scad>

brickAndText(" Set  ");
